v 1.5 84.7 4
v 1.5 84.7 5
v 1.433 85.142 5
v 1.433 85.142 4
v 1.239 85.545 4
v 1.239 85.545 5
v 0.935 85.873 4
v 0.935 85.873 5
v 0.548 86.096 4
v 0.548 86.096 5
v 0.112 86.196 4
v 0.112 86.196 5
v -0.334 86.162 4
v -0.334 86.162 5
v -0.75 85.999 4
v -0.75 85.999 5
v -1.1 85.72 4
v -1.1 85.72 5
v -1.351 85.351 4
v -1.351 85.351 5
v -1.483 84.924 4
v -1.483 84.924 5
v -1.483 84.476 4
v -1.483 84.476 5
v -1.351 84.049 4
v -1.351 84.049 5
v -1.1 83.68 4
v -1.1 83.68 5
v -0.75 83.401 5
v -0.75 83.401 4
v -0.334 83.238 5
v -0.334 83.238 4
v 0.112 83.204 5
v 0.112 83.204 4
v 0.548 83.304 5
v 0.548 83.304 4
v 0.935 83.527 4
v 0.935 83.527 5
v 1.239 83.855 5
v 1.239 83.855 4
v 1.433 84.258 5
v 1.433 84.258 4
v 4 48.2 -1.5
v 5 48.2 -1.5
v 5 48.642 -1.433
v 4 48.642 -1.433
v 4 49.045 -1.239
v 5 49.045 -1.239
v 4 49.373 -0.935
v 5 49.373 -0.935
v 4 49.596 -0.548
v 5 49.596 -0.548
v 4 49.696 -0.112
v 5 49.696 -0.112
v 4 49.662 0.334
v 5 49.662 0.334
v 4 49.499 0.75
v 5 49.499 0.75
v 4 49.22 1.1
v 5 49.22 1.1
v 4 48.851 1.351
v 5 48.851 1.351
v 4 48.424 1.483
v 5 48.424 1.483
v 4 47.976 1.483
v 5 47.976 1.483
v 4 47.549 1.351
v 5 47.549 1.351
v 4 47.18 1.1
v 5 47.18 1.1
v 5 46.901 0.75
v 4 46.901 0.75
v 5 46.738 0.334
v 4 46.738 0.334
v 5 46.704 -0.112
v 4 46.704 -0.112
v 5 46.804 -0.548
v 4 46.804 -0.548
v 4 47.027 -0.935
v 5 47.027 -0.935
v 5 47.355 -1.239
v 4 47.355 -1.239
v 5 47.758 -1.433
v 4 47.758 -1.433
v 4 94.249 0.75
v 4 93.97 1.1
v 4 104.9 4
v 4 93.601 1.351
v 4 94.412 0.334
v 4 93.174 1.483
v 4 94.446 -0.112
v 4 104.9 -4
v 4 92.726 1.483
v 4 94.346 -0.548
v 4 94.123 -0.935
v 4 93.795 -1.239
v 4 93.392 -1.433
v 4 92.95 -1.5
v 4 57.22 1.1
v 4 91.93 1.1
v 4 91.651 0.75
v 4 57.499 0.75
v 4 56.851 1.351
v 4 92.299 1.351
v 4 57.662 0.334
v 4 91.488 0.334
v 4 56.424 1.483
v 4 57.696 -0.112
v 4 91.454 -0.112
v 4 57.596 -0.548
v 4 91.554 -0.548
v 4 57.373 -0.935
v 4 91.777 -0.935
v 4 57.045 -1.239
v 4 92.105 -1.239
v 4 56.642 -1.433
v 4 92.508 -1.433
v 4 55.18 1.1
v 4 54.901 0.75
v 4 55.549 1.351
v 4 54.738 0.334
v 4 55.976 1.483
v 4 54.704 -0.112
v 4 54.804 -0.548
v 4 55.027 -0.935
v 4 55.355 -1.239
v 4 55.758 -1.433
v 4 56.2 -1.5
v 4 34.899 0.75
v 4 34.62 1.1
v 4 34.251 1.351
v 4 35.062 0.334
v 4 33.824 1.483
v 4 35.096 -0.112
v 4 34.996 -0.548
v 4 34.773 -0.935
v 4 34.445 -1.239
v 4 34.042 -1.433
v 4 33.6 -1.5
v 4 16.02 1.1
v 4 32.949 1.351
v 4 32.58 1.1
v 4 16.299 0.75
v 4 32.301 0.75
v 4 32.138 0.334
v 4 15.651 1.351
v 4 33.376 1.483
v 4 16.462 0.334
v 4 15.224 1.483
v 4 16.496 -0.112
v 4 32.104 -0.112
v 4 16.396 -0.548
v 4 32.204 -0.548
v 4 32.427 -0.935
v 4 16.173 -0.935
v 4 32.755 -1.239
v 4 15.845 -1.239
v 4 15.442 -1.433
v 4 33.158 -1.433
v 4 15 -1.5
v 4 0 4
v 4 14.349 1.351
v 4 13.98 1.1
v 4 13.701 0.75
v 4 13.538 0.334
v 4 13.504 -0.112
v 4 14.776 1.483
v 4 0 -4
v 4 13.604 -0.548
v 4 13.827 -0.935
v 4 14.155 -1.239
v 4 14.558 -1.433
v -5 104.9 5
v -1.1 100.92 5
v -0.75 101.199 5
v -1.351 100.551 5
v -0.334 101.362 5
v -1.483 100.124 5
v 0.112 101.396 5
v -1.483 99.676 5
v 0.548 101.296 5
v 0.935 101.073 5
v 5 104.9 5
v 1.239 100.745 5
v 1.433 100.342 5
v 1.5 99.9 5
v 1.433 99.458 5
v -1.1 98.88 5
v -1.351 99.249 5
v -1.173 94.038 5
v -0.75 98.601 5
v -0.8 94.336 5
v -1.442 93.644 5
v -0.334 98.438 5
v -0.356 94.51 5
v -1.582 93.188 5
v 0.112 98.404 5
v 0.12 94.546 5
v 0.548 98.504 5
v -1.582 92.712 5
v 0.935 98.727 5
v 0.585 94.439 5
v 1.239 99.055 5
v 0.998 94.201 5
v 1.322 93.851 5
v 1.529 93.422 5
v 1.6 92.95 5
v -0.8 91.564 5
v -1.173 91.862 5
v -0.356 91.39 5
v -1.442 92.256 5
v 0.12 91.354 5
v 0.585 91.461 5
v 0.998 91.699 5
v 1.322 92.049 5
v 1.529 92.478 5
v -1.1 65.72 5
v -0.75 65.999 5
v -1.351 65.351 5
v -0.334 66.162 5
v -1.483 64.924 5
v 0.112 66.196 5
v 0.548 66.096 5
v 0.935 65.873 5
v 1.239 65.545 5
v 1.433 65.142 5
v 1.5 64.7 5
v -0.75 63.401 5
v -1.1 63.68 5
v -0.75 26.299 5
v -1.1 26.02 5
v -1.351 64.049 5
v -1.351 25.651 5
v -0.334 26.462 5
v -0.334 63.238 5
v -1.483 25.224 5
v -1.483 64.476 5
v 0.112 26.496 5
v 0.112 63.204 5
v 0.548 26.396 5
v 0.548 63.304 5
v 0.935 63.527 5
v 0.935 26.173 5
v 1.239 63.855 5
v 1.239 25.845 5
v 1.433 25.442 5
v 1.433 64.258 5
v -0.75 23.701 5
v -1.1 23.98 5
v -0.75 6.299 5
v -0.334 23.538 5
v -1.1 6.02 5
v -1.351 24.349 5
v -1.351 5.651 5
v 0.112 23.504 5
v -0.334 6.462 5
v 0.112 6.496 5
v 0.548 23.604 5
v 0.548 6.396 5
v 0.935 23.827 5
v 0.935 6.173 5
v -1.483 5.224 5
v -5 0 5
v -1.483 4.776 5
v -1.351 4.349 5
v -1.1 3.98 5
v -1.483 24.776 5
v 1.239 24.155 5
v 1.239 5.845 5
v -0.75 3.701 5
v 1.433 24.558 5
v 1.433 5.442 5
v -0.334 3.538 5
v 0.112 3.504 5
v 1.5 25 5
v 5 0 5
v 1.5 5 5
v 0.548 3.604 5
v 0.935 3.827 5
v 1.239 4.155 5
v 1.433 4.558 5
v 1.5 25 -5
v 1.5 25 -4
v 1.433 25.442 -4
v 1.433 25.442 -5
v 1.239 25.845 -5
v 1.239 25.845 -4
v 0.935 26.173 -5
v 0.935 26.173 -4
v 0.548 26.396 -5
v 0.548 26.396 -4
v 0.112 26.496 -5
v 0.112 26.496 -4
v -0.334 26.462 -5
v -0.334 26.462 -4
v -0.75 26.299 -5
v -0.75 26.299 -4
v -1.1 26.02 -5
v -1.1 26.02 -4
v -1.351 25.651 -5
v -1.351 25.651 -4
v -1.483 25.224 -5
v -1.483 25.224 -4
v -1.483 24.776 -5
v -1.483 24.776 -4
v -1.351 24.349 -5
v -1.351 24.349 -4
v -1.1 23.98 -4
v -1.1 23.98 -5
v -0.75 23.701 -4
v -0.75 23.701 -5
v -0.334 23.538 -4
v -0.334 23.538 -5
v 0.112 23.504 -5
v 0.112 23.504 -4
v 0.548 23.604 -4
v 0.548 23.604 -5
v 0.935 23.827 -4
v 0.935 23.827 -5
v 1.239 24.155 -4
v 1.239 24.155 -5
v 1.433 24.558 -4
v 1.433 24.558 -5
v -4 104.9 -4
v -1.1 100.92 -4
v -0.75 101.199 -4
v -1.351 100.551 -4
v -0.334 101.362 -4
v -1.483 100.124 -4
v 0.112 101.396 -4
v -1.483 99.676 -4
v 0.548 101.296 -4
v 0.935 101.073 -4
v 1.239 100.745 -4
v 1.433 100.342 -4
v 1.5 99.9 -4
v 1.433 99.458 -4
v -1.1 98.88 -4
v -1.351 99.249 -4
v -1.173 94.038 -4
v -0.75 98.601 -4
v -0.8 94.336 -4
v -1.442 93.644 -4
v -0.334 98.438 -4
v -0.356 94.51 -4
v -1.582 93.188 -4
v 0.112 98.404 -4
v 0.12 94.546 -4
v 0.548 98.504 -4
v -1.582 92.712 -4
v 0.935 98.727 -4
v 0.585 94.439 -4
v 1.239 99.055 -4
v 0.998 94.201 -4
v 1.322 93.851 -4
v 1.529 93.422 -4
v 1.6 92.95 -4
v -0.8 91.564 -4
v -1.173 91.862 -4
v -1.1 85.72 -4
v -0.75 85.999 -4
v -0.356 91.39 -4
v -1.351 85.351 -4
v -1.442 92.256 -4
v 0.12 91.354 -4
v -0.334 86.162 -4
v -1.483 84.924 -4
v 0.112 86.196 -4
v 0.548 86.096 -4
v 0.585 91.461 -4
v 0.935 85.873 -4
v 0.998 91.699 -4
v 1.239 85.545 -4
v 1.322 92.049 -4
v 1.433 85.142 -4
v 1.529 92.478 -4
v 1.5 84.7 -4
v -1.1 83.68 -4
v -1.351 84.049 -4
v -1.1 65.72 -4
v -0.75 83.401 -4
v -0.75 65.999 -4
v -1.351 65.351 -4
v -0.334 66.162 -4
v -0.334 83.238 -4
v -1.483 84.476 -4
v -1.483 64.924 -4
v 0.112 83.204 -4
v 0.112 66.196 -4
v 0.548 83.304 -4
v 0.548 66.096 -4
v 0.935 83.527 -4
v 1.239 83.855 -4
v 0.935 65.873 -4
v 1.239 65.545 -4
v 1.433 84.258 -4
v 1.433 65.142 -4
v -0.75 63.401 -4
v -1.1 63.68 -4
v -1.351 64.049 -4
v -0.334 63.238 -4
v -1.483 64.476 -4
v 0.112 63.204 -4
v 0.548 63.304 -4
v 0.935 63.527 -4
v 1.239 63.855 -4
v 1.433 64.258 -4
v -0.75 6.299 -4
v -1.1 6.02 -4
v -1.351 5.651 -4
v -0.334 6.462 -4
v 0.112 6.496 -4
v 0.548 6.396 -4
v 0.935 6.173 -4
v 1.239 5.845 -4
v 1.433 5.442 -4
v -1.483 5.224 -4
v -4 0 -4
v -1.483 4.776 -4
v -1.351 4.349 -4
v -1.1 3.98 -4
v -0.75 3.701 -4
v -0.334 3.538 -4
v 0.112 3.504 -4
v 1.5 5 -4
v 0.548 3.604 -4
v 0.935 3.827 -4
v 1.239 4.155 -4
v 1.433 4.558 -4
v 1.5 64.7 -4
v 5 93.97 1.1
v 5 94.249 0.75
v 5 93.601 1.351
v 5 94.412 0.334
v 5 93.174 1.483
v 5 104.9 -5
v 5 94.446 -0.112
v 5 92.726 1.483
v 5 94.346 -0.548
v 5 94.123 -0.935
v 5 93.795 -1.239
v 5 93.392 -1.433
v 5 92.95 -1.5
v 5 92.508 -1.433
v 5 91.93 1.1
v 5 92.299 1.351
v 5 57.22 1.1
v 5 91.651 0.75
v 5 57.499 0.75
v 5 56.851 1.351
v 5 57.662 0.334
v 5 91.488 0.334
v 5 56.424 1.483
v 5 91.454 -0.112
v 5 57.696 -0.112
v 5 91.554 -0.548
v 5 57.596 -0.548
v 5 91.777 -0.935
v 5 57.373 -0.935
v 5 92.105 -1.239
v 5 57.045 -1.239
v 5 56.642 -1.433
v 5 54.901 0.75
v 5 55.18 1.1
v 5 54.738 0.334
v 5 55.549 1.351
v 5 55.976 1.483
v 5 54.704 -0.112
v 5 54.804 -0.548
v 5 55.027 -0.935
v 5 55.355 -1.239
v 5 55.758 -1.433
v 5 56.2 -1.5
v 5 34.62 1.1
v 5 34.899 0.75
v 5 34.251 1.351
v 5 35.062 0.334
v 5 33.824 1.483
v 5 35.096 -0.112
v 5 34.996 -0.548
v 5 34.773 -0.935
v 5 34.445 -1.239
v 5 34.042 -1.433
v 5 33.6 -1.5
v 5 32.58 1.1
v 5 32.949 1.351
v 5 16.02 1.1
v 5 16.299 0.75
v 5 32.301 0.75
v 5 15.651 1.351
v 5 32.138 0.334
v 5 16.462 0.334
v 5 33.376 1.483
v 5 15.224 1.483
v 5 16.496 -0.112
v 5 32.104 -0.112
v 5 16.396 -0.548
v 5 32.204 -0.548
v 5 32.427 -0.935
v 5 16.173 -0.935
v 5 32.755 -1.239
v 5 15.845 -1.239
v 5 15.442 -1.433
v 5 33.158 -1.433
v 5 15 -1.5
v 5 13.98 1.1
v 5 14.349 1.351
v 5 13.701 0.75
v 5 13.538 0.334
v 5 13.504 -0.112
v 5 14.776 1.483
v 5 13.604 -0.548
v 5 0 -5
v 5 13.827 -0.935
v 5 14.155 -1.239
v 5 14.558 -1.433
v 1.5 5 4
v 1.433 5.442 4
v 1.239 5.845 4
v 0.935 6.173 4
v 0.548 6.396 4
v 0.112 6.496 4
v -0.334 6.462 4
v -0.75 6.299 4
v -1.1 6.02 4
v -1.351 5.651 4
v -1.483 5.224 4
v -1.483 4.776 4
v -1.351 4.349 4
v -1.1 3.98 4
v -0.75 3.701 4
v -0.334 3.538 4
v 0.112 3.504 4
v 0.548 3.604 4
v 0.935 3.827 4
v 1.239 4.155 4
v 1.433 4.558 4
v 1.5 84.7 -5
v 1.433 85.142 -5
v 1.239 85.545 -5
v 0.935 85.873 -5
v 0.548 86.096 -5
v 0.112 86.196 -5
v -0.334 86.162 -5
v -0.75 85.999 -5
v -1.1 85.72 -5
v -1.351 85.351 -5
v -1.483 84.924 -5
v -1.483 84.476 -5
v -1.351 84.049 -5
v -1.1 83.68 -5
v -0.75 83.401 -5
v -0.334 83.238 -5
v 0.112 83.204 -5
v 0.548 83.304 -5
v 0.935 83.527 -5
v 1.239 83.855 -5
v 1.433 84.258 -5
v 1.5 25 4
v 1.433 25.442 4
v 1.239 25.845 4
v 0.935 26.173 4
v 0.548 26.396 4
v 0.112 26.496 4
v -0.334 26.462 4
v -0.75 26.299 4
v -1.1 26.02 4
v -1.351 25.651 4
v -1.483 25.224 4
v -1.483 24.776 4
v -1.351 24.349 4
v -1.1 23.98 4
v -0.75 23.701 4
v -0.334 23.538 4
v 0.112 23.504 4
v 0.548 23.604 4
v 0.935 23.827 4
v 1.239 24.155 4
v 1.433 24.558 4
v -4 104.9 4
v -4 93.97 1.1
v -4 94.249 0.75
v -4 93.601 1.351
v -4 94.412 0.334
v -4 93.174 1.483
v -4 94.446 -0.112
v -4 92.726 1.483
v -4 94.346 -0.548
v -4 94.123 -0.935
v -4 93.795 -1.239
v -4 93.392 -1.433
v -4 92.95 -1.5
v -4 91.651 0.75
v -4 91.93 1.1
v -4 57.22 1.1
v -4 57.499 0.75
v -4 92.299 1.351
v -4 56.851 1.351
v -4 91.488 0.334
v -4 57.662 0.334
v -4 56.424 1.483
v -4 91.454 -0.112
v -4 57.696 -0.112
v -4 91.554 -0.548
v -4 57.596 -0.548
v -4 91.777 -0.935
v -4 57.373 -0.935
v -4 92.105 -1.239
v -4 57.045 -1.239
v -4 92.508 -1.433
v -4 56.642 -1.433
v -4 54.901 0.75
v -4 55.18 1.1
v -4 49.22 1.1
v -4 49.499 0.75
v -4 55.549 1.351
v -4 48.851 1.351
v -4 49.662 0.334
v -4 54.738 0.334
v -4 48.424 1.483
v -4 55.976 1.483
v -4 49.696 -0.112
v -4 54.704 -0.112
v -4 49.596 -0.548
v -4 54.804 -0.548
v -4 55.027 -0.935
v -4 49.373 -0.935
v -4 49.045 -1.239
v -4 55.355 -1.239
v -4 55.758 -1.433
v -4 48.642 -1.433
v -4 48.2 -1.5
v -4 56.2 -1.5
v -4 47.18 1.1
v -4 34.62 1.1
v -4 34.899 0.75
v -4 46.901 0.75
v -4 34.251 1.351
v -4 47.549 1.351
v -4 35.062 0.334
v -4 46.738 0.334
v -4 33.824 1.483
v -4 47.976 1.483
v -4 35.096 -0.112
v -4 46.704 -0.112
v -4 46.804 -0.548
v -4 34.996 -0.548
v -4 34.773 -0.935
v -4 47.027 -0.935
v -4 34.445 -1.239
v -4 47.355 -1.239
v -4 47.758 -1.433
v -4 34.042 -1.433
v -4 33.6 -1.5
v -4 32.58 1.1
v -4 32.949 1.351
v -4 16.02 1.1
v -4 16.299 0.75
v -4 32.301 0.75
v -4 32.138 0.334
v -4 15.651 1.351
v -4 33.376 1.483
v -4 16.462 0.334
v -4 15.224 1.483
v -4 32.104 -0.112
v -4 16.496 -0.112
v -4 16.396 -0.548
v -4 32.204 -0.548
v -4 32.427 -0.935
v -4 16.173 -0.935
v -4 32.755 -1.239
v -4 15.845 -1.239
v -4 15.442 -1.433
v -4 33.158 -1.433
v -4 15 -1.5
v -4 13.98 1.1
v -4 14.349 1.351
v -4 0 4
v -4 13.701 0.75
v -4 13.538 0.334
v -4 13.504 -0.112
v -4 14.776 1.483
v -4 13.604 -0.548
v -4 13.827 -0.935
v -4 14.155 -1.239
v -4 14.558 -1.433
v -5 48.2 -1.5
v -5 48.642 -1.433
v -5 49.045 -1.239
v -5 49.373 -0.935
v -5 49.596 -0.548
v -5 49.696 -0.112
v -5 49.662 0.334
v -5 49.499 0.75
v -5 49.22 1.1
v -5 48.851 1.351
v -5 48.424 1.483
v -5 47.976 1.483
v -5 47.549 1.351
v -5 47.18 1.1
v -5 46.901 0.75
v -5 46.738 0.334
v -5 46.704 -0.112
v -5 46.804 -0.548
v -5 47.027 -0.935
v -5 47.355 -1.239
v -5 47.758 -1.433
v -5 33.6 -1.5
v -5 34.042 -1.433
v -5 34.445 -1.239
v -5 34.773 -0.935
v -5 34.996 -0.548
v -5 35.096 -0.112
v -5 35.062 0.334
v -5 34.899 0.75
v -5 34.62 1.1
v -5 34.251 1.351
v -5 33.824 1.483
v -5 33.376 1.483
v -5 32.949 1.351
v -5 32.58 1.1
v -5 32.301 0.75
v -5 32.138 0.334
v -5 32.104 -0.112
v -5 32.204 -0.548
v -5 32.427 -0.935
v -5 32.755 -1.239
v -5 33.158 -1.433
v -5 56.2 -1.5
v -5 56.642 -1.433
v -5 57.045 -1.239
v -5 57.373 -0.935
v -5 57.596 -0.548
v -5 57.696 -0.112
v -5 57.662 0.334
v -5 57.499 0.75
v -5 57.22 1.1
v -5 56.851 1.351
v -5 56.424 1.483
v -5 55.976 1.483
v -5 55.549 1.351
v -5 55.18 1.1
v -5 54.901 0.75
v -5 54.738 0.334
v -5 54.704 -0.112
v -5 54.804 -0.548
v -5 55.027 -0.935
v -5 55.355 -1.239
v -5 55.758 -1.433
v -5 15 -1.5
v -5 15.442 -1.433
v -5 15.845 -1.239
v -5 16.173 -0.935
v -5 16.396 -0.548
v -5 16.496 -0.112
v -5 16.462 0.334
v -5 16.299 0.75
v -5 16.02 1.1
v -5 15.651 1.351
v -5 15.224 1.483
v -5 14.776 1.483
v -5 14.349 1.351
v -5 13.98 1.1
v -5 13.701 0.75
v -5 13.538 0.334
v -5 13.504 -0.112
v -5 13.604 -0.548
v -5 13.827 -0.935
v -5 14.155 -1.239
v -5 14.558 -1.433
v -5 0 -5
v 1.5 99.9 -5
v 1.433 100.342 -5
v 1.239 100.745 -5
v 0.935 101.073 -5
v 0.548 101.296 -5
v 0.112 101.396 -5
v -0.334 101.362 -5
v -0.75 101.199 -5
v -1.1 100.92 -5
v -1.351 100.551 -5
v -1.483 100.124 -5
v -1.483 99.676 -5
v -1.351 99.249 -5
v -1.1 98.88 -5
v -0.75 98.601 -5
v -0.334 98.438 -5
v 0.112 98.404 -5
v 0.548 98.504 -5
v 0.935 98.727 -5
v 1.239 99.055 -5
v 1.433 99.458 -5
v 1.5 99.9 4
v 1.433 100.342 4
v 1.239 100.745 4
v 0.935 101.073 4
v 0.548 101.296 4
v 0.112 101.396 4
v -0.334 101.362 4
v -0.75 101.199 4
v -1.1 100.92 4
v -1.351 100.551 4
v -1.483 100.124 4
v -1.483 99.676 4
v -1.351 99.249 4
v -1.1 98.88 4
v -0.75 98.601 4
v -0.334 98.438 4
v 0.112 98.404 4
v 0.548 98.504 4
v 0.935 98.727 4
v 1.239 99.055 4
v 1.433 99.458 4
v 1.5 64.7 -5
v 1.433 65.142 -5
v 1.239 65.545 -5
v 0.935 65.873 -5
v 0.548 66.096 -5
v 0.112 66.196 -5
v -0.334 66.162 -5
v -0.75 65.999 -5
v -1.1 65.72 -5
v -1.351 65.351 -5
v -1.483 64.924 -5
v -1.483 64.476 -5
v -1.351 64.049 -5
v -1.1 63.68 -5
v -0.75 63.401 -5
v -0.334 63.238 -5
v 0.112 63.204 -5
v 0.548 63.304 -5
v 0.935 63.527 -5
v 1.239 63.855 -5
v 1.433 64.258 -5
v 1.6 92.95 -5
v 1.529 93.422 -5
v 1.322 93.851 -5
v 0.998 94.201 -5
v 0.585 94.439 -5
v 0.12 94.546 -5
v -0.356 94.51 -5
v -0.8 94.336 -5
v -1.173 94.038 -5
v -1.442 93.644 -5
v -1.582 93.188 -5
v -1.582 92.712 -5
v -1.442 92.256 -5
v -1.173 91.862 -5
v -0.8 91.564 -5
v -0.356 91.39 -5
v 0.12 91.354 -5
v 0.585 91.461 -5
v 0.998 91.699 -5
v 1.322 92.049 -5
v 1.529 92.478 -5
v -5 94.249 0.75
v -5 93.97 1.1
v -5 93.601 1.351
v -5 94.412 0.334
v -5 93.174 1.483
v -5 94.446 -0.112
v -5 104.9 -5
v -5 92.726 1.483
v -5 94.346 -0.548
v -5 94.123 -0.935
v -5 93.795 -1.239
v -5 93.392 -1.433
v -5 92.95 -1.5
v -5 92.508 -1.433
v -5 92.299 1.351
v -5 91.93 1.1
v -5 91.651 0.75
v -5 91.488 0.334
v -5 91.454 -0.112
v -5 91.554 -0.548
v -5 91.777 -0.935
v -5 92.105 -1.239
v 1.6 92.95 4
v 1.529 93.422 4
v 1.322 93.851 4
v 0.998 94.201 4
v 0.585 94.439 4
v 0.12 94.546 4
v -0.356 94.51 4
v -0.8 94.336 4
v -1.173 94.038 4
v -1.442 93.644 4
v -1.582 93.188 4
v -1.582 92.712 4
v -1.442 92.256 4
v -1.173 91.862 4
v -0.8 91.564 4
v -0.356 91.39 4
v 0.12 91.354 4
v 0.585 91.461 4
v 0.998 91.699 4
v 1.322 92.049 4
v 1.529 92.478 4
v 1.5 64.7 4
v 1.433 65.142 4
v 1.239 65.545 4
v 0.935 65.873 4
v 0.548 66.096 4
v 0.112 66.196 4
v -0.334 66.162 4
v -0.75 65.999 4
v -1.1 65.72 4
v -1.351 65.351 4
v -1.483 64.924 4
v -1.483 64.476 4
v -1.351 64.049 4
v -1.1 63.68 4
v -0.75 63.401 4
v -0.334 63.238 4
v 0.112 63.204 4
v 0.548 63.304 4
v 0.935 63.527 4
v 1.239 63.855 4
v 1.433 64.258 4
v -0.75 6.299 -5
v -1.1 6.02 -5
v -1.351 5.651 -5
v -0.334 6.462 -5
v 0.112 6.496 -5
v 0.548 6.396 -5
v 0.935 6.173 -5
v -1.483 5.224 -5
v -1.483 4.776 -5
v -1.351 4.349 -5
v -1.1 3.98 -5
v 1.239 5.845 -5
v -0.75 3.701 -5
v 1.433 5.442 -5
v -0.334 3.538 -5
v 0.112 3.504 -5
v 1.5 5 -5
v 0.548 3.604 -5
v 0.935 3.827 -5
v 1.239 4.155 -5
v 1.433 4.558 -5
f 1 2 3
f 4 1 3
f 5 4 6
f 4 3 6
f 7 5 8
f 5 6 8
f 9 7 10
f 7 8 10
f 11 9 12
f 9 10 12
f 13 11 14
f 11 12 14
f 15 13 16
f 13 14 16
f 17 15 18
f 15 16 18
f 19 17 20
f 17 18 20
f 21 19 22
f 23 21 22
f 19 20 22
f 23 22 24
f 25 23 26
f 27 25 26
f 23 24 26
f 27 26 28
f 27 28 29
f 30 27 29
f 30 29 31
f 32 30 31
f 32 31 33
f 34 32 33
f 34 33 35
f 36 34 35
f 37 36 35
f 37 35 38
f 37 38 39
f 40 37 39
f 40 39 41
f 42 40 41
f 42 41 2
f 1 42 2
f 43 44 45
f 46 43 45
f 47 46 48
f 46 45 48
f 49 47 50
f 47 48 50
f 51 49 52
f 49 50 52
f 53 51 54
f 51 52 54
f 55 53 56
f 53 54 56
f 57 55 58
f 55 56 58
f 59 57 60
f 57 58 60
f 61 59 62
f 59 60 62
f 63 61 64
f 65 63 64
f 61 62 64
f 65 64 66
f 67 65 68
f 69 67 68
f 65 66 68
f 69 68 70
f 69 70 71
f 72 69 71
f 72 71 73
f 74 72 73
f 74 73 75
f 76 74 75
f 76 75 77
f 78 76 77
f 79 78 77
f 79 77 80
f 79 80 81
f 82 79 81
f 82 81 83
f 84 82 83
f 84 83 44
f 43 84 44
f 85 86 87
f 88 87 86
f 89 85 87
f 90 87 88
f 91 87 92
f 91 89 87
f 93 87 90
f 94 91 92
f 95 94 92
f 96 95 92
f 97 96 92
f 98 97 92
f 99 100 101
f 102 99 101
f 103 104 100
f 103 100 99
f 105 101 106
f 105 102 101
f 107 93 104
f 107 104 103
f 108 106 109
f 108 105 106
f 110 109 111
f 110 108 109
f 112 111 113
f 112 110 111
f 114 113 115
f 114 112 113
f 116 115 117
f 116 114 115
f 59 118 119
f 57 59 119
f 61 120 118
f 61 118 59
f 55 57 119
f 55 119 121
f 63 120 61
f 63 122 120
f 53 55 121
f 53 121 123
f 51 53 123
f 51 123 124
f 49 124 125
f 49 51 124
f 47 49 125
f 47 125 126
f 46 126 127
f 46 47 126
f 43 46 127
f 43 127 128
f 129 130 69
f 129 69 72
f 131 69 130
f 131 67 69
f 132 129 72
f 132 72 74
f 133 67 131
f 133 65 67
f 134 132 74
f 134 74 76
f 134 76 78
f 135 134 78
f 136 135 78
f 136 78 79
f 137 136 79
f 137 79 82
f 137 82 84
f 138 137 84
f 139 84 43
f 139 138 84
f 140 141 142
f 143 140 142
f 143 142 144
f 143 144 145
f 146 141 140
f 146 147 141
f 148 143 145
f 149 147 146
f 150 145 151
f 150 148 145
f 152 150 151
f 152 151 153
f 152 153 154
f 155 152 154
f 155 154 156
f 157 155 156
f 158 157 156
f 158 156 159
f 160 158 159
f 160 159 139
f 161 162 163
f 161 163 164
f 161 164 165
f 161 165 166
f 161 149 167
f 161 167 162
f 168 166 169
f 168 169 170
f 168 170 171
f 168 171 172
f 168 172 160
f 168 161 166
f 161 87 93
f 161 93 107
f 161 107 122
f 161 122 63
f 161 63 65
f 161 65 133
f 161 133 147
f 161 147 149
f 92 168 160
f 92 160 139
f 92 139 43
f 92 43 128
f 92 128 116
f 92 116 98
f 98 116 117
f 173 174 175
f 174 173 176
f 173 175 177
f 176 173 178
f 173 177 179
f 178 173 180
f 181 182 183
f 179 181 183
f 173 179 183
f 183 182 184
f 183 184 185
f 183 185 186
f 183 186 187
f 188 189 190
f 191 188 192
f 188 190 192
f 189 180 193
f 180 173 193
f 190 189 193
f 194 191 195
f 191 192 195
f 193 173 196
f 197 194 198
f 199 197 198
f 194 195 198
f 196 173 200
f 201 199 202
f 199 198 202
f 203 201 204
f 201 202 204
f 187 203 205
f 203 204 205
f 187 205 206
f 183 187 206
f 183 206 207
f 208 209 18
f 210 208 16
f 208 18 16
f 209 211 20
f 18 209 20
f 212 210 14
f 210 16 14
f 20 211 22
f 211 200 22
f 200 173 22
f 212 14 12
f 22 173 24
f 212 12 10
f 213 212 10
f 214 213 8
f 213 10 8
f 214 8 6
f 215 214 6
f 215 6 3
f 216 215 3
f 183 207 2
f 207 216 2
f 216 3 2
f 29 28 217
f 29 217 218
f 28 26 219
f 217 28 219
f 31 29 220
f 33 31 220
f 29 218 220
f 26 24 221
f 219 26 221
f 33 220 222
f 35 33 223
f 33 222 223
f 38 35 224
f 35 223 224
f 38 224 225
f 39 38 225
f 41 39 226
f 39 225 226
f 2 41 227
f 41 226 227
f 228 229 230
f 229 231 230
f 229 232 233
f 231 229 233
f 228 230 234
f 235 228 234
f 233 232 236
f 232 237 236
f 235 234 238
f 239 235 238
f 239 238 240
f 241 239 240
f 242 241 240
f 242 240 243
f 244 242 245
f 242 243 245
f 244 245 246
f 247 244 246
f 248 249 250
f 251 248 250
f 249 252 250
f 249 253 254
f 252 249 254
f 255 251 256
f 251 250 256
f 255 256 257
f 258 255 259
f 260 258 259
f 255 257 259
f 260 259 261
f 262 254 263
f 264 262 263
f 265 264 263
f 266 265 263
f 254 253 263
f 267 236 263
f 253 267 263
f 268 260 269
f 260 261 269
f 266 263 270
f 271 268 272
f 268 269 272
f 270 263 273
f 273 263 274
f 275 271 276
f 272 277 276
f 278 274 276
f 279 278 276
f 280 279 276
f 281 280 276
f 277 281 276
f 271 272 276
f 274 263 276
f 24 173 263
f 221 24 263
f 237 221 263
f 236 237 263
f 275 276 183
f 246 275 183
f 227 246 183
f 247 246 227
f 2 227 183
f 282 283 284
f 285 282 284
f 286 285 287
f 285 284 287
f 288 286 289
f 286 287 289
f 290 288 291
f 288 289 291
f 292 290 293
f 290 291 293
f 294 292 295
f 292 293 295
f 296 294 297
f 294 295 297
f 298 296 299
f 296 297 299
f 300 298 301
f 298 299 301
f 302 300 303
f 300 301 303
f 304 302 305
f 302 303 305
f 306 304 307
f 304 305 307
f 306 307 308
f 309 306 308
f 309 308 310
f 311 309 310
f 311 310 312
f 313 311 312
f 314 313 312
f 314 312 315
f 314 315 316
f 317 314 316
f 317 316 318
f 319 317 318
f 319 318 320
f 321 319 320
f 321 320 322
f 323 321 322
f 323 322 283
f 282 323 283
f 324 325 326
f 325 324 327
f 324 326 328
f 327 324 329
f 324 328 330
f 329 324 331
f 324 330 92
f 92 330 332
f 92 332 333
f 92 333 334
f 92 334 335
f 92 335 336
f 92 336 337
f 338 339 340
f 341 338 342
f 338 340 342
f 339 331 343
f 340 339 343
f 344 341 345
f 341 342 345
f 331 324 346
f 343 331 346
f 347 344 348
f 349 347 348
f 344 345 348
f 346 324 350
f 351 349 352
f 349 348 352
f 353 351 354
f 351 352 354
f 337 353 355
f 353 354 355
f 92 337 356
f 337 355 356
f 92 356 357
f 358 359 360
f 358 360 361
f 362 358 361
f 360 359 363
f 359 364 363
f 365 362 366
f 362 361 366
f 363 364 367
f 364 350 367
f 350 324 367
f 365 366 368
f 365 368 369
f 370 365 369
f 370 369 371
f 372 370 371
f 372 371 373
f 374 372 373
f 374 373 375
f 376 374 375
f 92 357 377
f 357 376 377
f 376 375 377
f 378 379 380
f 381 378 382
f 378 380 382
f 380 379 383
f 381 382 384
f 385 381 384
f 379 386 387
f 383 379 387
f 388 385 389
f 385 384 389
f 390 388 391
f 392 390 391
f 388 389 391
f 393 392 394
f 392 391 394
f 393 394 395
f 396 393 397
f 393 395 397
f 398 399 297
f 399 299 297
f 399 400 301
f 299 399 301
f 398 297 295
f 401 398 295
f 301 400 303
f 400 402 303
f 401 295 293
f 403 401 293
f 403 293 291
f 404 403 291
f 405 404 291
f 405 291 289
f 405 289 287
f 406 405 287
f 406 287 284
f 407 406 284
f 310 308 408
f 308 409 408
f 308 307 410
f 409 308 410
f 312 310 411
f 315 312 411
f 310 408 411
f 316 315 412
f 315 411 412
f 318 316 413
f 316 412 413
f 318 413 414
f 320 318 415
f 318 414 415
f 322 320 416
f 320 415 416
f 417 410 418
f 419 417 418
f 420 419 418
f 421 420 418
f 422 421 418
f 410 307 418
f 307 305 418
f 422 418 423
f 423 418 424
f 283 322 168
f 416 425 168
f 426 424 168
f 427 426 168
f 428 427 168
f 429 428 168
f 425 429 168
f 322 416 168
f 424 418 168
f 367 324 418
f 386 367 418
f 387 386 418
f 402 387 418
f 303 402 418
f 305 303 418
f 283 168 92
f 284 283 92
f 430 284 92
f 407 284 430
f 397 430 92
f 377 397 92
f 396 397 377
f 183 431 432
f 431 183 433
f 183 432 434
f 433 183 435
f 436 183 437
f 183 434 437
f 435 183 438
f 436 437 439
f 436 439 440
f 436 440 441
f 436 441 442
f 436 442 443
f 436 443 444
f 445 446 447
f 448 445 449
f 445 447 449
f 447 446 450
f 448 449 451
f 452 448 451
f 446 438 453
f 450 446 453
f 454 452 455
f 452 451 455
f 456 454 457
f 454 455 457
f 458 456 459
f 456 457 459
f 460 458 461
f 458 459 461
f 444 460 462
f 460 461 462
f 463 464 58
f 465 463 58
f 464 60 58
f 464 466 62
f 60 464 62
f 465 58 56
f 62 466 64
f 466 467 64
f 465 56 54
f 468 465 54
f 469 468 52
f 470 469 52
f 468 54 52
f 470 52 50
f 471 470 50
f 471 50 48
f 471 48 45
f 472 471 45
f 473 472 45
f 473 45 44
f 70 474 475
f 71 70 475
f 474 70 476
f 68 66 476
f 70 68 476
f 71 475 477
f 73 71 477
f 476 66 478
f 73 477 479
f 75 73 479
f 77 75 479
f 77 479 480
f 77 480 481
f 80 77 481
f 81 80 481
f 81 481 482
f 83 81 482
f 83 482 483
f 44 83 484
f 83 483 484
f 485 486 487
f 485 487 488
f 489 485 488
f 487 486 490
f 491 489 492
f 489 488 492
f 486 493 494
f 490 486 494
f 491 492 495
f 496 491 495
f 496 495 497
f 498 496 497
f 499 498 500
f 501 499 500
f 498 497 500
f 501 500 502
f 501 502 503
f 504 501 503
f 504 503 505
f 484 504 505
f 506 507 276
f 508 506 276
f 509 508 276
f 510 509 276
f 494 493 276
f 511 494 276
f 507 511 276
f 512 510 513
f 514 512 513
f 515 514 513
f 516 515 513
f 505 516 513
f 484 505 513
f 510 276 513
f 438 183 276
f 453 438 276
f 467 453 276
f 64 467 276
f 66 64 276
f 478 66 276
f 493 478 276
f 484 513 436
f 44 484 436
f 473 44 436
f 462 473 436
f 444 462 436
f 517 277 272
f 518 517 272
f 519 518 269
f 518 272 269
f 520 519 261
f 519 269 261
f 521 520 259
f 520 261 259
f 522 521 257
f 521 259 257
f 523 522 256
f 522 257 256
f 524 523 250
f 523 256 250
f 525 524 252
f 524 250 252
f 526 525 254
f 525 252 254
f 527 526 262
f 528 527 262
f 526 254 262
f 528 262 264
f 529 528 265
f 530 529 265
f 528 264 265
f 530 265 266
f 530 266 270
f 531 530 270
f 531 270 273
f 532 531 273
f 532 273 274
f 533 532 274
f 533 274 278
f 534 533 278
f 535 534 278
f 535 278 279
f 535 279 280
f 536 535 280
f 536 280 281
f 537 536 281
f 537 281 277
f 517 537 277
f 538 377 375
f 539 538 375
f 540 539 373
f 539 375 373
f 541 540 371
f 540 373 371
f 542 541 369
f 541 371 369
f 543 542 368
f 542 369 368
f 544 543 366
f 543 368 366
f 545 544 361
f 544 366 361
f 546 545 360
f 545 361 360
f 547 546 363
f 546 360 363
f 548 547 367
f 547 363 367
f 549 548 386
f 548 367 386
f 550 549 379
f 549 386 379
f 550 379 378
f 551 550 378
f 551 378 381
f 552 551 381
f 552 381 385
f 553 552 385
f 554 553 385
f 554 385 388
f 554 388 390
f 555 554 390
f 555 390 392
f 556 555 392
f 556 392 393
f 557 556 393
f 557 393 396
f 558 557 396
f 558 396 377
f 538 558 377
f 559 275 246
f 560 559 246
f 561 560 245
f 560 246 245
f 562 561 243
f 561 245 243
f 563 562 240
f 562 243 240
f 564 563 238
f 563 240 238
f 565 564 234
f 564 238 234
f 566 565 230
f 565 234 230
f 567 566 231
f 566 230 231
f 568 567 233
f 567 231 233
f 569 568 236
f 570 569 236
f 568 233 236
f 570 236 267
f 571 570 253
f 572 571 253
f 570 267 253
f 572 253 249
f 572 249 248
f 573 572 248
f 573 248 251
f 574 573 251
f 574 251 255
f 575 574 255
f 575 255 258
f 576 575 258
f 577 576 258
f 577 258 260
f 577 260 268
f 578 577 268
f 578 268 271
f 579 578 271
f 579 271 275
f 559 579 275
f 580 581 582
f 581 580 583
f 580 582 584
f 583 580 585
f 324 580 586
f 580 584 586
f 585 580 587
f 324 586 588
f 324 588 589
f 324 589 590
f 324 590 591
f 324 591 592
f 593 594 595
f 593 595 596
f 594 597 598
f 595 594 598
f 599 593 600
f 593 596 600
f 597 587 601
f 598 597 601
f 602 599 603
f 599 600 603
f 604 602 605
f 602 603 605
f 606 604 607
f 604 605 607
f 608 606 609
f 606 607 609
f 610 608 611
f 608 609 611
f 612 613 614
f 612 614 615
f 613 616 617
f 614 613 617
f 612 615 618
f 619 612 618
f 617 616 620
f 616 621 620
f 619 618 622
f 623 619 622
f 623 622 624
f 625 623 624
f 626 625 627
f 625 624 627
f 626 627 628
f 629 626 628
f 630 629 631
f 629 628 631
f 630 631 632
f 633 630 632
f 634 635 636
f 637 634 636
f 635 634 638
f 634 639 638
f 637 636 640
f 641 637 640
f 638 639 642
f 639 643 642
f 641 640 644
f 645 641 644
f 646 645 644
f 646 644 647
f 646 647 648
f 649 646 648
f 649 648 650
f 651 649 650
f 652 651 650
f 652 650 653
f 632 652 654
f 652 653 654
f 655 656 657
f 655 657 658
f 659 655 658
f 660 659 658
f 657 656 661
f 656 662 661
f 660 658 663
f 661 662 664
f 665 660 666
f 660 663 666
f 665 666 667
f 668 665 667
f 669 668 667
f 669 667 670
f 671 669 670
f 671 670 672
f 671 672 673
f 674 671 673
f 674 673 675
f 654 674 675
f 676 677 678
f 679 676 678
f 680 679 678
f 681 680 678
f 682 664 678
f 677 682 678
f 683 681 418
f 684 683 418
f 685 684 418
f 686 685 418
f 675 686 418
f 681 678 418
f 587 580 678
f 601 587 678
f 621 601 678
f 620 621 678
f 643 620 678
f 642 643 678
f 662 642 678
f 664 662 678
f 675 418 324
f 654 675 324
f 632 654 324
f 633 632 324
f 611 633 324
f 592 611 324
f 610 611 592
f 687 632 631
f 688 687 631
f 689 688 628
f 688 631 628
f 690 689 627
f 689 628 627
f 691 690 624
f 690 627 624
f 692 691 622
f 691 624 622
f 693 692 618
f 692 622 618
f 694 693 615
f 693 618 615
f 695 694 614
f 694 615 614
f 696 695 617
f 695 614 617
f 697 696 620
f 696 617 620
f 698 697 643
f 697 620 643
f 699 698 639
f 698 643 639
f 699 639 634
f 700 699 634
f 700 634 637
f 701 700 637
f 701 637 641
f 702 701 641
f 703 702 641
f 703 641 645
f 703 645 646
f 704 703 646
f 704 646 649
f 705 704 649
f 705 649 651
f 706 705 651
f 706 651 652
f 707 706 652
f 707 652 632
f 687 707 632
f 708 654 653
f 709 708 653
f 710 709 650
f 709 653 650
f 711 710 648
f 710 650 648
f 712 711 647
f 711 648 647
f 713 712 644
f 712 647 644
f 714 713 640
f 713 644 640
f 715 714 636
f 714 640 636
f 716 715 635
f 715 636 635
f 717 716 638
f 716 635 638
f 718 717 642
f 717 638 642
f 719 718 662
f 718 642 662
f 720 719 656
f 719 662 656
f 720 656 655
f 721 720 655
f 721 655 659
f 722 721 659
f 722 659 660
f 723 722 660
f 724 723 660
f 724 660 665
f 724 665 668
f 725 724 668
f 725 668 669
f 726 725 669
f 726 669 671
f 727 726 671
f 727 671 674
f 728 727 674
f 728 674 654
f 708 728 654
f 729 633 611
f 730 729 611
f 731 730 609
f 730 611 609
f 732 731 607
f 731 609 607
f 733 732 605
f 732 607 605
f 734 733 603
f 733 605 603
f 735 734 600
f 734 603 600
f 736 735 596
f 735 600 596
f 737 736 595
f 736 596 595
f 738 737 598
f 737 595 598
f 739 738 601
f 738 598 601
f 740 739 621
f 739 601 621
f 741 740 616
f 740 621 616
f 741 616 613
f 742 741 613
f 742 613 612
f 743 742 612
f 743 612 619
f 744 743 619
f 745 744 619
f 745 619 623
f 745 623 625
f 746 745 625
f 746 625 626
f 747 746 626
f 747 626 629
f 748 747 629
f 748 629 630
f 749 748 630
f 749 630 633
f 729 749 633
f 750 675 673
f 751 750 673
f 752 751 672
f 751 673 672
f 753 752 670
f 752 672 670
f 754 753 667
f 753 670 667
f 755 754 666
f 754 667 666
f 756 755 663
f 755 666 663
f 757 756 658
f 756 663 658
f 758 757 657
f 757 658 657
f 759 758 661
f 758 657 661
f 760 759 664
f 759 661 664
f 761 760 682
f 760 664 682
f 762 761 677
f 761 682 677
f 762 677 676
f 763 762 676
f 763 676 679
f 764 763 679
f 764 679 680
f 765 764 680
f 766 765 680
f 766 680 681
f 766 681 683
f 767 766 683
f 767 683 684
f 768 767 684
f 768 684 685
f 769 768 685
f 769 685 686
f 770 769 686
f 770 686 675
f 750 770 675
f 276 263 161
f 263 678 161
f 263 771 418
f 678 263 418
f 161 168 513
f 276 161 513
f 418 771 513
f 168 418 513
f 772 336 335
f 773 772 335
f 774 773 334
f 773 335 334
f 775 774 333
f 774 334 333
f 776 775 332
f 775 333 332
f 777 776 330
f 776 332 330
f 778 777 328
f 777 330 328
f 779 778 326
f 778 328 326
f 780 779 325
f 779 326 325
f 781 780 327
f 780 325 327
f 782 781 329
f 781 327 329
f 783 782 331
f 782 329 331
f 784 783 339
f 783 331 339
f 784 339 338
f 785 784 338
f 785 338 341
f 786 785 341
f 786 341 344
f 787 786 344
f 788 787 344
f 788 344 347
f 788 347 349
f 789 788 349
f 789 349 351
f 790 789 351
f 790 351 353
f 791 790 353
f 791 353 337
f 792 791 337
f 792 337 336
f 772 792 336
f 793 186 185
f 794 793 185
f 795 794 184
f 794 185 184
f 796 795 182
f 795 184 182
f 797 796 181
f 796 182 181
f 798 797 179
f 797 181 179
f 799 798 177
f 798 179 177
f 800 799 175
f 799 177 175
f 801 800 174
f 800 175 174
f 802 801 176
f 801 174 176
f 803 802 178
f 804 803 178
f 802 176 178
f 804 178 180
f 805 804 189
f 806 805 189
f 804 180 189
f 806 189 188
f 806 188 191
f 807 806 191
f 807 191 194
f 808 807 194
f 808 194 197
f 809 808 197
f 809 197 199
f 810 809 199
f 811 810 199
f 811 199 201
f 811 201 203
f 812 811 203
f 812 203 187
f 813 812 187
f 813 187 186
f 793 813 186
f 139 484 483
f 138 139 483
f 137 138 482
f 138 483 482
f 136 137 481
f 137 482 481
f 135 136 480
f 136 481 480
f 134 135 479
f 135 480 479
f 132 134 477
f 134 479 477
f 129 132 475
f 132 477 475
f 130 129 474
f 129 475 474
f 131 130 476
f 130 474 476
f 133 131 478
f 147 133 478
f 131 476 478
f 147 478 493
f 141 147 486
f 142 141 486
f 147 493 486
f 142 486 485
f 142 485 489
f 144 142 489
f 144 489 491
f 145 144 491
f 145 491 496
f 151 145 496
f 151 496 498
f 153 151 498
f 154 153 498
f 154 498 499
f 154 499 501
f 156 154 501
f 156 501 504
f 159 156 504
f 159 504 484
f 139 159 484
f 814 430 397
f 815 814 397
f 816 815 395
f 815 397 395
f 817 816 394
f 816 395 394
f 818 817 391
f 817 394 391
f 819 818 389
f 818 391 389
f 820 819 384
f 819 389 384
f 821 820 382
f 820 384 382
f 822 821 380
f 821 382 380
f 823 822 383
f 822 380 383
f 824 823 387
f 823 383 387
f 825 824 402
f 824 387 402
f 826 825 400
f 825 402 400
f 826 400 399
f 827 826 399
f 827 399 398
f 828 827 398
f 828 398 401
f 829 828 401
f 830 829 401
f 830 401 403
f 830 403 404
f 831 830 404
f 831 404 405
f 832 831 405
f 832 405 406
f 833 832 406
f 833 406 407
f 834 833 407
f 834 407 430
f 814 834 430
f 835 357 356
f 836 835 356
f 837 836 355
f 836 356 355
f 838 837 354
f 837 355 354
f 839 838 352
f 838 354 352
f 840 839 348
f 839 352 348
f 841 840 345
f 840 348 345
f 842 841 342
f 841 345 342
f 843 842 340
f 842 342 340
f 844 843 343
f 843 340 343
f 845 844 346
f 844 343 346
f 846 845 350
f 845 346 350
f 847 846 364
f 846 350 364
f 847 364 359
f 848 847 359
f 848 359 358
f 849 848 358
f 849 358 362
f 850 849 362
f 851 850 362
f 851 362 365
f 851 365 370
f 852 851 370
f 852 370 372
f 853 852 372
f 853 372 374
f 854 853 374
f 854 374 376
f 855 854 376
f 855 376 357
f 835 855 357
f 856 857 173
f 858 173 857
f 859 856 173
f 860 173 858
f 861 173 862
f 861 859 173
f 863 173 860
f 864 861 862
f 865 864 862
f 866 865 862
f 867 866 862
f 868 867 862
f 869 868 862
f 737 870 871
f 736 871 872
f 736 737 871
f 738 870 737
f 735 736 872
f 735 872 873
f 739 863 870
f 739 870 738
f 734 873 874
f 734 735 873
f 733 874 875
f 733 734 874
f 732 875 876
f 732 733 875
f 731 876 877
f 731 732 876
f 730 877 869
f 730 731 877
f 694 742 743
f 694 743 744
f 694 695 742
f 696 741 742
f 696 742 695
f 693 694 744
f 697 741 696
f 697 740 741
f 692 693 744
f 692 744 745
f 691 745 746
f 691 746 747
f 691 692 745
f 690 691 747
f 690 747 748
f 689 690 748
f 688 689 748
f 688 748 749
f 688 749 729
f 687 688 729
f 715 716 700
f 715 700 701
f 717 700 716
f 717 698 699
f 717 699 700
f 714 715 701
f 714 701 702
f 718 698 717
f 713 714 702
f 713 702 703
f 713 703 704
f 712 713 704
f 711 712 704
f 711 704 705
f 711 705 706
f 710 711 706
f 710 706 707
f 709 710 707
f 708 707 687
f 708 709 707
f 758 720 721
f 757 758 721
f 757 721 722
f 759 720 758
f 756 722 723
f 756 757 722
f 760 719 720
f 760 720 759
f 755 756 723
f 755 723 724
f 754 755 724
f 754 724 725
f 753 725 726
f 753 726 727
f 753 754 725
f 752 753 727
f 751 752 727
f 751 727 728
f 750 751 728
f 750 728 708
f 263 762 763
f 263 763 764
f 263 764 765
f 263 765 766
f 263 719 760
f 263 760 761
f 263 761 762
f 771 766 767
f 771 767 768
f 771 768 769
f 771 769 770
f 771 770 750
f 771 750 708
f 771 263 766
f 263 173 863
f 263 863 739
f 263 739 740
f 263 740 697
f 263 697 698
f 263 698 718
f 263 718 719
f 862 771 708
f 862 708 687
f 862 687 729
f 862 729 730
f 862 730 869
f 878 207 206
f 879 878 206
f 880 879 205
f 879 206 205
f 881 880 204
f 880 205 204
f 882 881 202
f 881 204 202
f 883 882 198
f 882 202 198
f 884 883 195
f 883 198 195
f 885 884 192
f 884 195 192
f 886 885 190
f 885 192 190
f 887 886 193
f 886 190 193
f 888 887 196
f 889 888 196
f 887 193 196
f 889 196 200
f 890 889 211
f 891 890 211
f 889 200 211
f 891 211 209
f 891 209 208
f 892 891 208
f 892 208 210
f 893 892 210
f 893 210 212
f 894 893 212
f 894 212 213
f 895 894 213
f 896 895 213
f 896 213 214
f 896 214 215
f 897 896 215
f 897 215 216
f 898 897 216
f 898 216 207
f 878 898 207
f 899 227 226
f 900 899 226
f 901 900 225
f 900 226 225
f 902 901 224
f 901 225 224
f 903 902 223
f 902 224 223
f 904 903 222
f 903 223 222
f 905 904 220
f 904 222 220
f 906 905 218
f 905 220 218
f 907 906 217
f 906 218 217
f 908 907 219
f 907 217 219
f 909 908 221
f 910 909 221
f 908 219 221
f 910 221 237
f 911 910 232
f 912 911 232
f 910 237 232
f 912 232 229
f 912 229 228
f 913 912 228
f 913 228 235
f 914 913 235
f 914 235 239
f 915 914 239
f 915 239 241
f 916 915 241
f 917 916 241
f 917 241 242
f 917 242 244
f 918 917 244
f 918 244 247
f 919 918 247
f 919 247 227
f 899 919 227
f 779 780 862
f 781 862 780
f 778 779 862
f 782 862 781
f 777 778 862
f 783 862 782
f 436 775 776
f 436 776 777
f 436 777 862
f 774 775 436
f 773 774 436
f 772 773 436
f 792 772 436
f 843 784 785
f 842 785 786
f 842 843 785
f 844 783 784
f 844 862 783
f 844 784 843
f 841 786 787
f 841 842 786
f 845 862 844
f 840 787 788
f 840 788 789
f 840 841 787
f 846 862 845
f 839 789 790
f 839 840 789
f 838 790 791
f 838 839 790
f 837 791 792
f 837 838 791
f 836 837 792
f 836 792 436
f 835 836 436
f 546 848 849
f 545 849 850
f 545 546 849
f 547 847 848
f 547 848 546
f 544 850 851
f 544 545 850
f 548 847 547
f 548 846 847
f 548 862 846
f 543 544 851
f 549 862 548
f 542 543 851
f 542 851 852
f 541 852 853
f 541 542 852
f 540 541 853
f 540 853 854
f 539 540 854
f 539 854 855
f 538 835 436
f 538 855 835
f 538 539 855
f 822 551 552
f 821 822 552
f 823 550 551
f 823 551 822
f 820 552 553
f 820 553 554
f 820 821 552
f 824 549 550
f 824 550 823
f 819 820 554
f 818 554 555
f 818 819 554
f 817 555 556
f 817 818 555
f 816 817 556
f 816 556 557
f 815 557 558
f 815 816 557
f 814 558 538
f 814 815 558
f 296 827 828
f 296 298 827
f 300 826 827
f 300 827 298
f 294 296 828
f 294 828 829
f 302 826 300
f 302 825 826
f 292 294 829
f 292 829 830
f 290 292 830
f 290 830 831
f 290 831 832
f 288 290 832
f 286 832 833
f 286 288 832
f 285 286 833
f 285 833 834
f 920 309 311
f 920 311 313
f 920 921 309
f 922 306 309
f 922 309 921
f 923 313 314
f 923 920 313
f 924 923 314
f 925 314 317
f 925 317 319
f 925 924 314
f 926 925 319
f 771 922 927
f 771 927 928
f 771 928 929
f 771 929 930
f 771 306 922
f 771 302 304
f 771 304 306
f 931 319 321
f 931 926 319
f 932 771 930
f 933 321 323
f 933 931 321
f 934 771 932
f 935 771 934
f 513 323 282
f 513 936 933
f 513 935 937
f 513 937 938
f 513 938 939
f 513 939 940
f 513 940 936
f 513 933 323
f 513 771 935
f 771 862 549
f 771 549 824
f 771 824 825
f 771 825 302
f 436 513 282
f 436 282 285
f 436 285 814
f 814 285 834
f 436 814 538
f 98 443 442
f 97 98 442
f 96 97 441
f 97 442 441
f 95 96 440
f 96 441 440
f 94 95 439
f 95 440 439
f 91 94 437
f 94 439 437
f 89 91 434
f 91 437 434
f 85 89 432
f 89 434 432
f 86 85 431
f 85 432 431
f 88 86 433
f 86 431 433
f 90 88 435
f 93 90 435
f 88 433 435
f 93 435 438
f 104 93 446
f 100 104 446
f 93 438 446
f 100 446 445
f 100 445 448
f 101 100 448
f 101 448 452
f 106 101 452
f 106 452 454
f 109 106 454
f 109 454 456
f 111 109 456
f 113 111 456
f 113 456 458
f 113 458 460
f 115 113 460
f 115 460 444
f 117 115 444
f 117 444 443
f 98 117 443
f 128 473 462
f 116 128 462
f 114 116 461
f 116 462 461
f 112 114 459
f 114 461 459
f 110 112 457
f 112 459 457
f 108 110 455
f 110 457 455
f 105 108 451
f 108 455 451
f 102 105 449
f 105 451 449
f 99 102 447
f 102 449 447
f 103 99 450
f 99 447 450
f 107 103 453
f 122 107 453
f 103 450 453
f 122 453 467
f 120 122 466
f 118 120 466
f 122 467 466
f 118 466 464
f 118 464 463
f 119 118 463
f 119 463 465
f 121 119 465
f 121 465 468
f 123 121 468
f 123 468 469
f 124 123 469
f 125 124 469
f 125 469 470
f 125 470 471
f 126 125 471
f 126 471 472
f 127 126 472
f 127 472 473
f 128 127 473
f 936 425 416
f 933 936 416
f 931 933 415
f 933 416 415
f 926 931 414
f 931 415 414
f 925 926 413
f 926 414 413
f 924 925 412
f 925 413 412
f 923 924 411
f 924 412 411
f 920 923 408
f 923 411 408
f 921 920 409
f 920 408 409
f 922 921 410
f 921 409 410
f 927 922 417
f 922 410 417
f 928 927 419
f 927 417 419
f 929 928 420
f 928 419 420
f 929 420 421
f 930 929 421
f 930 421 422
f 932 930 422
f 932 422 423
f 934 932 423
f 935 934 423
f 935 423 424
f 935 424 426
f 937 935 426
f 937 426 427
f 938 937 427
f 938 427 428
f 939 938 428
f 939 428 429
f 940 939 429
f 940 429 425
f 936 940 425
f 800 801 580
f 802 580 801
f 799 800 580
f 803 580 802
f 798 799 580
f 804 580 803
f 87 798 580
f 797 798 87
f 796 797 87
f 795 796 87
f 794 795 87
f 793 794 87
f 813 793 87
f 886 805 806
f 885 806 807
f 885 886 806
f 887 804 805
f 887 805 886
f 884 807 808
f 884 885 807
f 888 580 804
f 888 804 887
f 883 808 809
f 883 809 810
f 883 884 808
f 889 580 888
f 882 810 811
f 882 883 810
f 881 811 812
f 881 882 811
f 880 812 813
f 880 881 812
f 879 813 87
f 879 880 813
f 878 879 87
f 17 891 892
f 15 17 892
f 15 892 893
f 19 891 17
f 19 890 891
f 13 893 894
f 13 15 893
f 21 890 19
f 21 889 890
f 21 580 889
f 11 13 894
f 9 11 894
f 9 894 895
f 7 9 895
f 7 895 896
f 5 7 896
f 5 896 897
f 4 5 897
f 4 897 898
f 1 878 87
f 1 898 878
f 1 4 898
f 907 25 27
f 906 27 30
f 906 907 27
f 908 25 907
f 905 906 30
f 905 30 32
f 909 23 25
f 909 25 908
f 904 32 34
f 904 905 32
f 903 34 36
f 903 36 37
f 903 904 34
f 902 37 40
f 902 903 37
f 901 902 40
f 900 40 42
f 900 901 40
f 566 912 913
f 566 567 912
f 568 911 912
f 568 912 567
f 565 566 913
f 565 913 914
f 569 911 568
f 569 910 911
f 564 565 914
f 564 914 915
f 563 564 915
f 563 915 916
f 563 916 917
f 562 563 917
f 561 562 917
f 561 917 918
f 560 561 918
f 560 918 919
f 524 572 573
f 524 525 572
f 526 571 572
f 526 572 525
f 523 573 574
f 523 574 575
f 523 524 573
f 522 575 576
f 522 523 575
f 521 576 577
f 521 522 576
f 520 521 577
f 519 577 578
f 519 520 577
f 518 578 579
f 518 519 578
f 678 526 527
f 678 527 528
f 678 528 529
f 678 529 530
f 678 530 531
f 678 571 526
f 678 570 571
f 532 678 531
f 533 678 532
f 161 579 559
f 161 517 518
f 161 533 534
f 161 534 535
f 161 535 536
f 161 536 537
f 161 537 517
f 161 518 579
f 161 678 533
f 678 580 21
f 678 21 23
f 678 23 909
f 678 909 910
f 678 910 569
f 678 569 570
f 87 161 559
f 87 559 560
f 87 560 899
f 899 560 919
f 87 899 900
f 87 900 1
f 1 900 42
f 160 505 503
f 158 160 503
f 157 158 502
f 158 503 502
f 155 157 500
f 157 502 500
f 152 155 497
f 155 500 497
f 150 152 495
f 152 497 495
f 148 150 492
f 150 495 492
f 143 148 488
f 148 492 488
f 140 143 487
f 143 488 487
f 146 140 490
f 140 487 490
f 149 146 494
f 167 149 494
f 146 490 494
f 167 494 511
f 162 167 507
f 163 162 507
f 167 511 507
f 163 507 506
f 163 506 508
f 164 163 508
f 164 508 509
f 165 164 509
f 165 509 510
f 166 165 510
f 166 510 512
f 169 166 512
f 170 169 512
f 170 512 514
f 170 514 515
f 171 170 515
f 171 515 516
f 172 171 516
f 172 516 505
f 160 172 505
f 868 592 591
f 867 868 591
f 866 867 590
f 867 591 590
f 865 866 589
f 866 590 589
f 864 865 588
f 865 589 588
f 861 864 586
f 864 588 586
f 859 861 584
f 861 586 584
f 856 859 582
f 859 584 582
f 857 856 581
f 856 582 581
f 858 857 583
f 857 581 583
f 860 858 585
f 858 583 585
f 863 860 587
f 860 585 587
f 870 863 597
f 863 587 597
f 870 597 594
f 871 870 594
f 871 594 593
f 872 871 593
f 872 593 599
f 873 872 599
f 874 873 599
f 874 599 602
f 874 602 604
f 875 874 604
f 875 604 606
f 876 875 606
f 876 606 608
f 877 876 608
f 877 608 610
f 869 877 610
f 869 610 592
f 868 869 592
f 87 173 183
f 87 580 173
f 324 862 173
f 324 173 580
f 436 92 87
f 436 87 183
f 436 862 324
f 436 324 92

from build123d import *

# Parameters (mm, degrees)
SKETCH_1_W          = 10
SKETCH_1_H          = 10
SKETCH_1_W_2        = 8
SKETCH_1_H_2        = 8
EXTRUDE_1_DEPTH     = 104.9
SKETCH_2_R          = 1.5
SKETCH_2_R_2        = 1.6
CUT_EXTRUDE_1_DEPTH = 106.494123059
SKETCH_3_R          = 1.5
CUT_EXTRUDE_2_DEPTH = 106.494123059


with BuildPart() as part:
    # ｽｹｯﾁ1 → 押し出し-薄板1 (new body)
    with BuildSketch(Plane(origin=(0, 0, 0), x_dir=(1, 0, 0), z_dir=(0, 1, 0))):
        Rectangle(SKETCH_1_W, SKETCH_1_H)
        Rectangle(SKETCH_1_W_2, SKETCH_1_H_2, mode=Mode.SUBTRACT)
    extrude(amount=EXTRUDE_1_DEPTH)

    # ｽｹｯﾁ2 → ｶｯﾄ - 押し出し1 (cut, through all)
    with BuildSketch(Plane.XY.offset(5)):
        with Locations((0, 5)):
            Circle(SKETCH_2_R)
        with Locations((0, 64.7)):
            Circle(SKETCH_2_R)
        with Locations((0, 99.9)):
            Circle(SKETCH_2_R)
        with Locations((0, 84.7)):
            Circle(SKETCH_2_R)
        with Locations((0, 25)):
            Circle(SKETCH_2_R)
        with Locations((0, 92.95)):
            Circle(SKETCH_2_R_2)
    extrude(amount=-CUT_EXTRUDE_1_DEPTH, mode=Mode.SUBTRACT)

    # ｽｹｯﾁ3 → ｶｯﾄ - 押し出し2 (cut, through all)
    with BuildSketch(Plane(origin=(5, 0, 0), x_dir=(0, 0, -1), z_dir=(1, 0, 0))):
        with Locations((0, 33.6)):
            Circle(SKETCH_3_R)
        with Locations((0, 15)):
            Circle(SKETCH_3_R)
        with Locations((0, 48.2)):
            Circle(SKETCH_3_R)
        with Locations((0, 56.2)):
            Circle(SKETCH_3_R)
        with Locations((0, 92.95)):
            Circle(SKETCH_3_R)
    extrude(amount=-CUT_EXTRUDE_2_DEPTH, mode=Mode.SUBTRACT)


solid = part.part
